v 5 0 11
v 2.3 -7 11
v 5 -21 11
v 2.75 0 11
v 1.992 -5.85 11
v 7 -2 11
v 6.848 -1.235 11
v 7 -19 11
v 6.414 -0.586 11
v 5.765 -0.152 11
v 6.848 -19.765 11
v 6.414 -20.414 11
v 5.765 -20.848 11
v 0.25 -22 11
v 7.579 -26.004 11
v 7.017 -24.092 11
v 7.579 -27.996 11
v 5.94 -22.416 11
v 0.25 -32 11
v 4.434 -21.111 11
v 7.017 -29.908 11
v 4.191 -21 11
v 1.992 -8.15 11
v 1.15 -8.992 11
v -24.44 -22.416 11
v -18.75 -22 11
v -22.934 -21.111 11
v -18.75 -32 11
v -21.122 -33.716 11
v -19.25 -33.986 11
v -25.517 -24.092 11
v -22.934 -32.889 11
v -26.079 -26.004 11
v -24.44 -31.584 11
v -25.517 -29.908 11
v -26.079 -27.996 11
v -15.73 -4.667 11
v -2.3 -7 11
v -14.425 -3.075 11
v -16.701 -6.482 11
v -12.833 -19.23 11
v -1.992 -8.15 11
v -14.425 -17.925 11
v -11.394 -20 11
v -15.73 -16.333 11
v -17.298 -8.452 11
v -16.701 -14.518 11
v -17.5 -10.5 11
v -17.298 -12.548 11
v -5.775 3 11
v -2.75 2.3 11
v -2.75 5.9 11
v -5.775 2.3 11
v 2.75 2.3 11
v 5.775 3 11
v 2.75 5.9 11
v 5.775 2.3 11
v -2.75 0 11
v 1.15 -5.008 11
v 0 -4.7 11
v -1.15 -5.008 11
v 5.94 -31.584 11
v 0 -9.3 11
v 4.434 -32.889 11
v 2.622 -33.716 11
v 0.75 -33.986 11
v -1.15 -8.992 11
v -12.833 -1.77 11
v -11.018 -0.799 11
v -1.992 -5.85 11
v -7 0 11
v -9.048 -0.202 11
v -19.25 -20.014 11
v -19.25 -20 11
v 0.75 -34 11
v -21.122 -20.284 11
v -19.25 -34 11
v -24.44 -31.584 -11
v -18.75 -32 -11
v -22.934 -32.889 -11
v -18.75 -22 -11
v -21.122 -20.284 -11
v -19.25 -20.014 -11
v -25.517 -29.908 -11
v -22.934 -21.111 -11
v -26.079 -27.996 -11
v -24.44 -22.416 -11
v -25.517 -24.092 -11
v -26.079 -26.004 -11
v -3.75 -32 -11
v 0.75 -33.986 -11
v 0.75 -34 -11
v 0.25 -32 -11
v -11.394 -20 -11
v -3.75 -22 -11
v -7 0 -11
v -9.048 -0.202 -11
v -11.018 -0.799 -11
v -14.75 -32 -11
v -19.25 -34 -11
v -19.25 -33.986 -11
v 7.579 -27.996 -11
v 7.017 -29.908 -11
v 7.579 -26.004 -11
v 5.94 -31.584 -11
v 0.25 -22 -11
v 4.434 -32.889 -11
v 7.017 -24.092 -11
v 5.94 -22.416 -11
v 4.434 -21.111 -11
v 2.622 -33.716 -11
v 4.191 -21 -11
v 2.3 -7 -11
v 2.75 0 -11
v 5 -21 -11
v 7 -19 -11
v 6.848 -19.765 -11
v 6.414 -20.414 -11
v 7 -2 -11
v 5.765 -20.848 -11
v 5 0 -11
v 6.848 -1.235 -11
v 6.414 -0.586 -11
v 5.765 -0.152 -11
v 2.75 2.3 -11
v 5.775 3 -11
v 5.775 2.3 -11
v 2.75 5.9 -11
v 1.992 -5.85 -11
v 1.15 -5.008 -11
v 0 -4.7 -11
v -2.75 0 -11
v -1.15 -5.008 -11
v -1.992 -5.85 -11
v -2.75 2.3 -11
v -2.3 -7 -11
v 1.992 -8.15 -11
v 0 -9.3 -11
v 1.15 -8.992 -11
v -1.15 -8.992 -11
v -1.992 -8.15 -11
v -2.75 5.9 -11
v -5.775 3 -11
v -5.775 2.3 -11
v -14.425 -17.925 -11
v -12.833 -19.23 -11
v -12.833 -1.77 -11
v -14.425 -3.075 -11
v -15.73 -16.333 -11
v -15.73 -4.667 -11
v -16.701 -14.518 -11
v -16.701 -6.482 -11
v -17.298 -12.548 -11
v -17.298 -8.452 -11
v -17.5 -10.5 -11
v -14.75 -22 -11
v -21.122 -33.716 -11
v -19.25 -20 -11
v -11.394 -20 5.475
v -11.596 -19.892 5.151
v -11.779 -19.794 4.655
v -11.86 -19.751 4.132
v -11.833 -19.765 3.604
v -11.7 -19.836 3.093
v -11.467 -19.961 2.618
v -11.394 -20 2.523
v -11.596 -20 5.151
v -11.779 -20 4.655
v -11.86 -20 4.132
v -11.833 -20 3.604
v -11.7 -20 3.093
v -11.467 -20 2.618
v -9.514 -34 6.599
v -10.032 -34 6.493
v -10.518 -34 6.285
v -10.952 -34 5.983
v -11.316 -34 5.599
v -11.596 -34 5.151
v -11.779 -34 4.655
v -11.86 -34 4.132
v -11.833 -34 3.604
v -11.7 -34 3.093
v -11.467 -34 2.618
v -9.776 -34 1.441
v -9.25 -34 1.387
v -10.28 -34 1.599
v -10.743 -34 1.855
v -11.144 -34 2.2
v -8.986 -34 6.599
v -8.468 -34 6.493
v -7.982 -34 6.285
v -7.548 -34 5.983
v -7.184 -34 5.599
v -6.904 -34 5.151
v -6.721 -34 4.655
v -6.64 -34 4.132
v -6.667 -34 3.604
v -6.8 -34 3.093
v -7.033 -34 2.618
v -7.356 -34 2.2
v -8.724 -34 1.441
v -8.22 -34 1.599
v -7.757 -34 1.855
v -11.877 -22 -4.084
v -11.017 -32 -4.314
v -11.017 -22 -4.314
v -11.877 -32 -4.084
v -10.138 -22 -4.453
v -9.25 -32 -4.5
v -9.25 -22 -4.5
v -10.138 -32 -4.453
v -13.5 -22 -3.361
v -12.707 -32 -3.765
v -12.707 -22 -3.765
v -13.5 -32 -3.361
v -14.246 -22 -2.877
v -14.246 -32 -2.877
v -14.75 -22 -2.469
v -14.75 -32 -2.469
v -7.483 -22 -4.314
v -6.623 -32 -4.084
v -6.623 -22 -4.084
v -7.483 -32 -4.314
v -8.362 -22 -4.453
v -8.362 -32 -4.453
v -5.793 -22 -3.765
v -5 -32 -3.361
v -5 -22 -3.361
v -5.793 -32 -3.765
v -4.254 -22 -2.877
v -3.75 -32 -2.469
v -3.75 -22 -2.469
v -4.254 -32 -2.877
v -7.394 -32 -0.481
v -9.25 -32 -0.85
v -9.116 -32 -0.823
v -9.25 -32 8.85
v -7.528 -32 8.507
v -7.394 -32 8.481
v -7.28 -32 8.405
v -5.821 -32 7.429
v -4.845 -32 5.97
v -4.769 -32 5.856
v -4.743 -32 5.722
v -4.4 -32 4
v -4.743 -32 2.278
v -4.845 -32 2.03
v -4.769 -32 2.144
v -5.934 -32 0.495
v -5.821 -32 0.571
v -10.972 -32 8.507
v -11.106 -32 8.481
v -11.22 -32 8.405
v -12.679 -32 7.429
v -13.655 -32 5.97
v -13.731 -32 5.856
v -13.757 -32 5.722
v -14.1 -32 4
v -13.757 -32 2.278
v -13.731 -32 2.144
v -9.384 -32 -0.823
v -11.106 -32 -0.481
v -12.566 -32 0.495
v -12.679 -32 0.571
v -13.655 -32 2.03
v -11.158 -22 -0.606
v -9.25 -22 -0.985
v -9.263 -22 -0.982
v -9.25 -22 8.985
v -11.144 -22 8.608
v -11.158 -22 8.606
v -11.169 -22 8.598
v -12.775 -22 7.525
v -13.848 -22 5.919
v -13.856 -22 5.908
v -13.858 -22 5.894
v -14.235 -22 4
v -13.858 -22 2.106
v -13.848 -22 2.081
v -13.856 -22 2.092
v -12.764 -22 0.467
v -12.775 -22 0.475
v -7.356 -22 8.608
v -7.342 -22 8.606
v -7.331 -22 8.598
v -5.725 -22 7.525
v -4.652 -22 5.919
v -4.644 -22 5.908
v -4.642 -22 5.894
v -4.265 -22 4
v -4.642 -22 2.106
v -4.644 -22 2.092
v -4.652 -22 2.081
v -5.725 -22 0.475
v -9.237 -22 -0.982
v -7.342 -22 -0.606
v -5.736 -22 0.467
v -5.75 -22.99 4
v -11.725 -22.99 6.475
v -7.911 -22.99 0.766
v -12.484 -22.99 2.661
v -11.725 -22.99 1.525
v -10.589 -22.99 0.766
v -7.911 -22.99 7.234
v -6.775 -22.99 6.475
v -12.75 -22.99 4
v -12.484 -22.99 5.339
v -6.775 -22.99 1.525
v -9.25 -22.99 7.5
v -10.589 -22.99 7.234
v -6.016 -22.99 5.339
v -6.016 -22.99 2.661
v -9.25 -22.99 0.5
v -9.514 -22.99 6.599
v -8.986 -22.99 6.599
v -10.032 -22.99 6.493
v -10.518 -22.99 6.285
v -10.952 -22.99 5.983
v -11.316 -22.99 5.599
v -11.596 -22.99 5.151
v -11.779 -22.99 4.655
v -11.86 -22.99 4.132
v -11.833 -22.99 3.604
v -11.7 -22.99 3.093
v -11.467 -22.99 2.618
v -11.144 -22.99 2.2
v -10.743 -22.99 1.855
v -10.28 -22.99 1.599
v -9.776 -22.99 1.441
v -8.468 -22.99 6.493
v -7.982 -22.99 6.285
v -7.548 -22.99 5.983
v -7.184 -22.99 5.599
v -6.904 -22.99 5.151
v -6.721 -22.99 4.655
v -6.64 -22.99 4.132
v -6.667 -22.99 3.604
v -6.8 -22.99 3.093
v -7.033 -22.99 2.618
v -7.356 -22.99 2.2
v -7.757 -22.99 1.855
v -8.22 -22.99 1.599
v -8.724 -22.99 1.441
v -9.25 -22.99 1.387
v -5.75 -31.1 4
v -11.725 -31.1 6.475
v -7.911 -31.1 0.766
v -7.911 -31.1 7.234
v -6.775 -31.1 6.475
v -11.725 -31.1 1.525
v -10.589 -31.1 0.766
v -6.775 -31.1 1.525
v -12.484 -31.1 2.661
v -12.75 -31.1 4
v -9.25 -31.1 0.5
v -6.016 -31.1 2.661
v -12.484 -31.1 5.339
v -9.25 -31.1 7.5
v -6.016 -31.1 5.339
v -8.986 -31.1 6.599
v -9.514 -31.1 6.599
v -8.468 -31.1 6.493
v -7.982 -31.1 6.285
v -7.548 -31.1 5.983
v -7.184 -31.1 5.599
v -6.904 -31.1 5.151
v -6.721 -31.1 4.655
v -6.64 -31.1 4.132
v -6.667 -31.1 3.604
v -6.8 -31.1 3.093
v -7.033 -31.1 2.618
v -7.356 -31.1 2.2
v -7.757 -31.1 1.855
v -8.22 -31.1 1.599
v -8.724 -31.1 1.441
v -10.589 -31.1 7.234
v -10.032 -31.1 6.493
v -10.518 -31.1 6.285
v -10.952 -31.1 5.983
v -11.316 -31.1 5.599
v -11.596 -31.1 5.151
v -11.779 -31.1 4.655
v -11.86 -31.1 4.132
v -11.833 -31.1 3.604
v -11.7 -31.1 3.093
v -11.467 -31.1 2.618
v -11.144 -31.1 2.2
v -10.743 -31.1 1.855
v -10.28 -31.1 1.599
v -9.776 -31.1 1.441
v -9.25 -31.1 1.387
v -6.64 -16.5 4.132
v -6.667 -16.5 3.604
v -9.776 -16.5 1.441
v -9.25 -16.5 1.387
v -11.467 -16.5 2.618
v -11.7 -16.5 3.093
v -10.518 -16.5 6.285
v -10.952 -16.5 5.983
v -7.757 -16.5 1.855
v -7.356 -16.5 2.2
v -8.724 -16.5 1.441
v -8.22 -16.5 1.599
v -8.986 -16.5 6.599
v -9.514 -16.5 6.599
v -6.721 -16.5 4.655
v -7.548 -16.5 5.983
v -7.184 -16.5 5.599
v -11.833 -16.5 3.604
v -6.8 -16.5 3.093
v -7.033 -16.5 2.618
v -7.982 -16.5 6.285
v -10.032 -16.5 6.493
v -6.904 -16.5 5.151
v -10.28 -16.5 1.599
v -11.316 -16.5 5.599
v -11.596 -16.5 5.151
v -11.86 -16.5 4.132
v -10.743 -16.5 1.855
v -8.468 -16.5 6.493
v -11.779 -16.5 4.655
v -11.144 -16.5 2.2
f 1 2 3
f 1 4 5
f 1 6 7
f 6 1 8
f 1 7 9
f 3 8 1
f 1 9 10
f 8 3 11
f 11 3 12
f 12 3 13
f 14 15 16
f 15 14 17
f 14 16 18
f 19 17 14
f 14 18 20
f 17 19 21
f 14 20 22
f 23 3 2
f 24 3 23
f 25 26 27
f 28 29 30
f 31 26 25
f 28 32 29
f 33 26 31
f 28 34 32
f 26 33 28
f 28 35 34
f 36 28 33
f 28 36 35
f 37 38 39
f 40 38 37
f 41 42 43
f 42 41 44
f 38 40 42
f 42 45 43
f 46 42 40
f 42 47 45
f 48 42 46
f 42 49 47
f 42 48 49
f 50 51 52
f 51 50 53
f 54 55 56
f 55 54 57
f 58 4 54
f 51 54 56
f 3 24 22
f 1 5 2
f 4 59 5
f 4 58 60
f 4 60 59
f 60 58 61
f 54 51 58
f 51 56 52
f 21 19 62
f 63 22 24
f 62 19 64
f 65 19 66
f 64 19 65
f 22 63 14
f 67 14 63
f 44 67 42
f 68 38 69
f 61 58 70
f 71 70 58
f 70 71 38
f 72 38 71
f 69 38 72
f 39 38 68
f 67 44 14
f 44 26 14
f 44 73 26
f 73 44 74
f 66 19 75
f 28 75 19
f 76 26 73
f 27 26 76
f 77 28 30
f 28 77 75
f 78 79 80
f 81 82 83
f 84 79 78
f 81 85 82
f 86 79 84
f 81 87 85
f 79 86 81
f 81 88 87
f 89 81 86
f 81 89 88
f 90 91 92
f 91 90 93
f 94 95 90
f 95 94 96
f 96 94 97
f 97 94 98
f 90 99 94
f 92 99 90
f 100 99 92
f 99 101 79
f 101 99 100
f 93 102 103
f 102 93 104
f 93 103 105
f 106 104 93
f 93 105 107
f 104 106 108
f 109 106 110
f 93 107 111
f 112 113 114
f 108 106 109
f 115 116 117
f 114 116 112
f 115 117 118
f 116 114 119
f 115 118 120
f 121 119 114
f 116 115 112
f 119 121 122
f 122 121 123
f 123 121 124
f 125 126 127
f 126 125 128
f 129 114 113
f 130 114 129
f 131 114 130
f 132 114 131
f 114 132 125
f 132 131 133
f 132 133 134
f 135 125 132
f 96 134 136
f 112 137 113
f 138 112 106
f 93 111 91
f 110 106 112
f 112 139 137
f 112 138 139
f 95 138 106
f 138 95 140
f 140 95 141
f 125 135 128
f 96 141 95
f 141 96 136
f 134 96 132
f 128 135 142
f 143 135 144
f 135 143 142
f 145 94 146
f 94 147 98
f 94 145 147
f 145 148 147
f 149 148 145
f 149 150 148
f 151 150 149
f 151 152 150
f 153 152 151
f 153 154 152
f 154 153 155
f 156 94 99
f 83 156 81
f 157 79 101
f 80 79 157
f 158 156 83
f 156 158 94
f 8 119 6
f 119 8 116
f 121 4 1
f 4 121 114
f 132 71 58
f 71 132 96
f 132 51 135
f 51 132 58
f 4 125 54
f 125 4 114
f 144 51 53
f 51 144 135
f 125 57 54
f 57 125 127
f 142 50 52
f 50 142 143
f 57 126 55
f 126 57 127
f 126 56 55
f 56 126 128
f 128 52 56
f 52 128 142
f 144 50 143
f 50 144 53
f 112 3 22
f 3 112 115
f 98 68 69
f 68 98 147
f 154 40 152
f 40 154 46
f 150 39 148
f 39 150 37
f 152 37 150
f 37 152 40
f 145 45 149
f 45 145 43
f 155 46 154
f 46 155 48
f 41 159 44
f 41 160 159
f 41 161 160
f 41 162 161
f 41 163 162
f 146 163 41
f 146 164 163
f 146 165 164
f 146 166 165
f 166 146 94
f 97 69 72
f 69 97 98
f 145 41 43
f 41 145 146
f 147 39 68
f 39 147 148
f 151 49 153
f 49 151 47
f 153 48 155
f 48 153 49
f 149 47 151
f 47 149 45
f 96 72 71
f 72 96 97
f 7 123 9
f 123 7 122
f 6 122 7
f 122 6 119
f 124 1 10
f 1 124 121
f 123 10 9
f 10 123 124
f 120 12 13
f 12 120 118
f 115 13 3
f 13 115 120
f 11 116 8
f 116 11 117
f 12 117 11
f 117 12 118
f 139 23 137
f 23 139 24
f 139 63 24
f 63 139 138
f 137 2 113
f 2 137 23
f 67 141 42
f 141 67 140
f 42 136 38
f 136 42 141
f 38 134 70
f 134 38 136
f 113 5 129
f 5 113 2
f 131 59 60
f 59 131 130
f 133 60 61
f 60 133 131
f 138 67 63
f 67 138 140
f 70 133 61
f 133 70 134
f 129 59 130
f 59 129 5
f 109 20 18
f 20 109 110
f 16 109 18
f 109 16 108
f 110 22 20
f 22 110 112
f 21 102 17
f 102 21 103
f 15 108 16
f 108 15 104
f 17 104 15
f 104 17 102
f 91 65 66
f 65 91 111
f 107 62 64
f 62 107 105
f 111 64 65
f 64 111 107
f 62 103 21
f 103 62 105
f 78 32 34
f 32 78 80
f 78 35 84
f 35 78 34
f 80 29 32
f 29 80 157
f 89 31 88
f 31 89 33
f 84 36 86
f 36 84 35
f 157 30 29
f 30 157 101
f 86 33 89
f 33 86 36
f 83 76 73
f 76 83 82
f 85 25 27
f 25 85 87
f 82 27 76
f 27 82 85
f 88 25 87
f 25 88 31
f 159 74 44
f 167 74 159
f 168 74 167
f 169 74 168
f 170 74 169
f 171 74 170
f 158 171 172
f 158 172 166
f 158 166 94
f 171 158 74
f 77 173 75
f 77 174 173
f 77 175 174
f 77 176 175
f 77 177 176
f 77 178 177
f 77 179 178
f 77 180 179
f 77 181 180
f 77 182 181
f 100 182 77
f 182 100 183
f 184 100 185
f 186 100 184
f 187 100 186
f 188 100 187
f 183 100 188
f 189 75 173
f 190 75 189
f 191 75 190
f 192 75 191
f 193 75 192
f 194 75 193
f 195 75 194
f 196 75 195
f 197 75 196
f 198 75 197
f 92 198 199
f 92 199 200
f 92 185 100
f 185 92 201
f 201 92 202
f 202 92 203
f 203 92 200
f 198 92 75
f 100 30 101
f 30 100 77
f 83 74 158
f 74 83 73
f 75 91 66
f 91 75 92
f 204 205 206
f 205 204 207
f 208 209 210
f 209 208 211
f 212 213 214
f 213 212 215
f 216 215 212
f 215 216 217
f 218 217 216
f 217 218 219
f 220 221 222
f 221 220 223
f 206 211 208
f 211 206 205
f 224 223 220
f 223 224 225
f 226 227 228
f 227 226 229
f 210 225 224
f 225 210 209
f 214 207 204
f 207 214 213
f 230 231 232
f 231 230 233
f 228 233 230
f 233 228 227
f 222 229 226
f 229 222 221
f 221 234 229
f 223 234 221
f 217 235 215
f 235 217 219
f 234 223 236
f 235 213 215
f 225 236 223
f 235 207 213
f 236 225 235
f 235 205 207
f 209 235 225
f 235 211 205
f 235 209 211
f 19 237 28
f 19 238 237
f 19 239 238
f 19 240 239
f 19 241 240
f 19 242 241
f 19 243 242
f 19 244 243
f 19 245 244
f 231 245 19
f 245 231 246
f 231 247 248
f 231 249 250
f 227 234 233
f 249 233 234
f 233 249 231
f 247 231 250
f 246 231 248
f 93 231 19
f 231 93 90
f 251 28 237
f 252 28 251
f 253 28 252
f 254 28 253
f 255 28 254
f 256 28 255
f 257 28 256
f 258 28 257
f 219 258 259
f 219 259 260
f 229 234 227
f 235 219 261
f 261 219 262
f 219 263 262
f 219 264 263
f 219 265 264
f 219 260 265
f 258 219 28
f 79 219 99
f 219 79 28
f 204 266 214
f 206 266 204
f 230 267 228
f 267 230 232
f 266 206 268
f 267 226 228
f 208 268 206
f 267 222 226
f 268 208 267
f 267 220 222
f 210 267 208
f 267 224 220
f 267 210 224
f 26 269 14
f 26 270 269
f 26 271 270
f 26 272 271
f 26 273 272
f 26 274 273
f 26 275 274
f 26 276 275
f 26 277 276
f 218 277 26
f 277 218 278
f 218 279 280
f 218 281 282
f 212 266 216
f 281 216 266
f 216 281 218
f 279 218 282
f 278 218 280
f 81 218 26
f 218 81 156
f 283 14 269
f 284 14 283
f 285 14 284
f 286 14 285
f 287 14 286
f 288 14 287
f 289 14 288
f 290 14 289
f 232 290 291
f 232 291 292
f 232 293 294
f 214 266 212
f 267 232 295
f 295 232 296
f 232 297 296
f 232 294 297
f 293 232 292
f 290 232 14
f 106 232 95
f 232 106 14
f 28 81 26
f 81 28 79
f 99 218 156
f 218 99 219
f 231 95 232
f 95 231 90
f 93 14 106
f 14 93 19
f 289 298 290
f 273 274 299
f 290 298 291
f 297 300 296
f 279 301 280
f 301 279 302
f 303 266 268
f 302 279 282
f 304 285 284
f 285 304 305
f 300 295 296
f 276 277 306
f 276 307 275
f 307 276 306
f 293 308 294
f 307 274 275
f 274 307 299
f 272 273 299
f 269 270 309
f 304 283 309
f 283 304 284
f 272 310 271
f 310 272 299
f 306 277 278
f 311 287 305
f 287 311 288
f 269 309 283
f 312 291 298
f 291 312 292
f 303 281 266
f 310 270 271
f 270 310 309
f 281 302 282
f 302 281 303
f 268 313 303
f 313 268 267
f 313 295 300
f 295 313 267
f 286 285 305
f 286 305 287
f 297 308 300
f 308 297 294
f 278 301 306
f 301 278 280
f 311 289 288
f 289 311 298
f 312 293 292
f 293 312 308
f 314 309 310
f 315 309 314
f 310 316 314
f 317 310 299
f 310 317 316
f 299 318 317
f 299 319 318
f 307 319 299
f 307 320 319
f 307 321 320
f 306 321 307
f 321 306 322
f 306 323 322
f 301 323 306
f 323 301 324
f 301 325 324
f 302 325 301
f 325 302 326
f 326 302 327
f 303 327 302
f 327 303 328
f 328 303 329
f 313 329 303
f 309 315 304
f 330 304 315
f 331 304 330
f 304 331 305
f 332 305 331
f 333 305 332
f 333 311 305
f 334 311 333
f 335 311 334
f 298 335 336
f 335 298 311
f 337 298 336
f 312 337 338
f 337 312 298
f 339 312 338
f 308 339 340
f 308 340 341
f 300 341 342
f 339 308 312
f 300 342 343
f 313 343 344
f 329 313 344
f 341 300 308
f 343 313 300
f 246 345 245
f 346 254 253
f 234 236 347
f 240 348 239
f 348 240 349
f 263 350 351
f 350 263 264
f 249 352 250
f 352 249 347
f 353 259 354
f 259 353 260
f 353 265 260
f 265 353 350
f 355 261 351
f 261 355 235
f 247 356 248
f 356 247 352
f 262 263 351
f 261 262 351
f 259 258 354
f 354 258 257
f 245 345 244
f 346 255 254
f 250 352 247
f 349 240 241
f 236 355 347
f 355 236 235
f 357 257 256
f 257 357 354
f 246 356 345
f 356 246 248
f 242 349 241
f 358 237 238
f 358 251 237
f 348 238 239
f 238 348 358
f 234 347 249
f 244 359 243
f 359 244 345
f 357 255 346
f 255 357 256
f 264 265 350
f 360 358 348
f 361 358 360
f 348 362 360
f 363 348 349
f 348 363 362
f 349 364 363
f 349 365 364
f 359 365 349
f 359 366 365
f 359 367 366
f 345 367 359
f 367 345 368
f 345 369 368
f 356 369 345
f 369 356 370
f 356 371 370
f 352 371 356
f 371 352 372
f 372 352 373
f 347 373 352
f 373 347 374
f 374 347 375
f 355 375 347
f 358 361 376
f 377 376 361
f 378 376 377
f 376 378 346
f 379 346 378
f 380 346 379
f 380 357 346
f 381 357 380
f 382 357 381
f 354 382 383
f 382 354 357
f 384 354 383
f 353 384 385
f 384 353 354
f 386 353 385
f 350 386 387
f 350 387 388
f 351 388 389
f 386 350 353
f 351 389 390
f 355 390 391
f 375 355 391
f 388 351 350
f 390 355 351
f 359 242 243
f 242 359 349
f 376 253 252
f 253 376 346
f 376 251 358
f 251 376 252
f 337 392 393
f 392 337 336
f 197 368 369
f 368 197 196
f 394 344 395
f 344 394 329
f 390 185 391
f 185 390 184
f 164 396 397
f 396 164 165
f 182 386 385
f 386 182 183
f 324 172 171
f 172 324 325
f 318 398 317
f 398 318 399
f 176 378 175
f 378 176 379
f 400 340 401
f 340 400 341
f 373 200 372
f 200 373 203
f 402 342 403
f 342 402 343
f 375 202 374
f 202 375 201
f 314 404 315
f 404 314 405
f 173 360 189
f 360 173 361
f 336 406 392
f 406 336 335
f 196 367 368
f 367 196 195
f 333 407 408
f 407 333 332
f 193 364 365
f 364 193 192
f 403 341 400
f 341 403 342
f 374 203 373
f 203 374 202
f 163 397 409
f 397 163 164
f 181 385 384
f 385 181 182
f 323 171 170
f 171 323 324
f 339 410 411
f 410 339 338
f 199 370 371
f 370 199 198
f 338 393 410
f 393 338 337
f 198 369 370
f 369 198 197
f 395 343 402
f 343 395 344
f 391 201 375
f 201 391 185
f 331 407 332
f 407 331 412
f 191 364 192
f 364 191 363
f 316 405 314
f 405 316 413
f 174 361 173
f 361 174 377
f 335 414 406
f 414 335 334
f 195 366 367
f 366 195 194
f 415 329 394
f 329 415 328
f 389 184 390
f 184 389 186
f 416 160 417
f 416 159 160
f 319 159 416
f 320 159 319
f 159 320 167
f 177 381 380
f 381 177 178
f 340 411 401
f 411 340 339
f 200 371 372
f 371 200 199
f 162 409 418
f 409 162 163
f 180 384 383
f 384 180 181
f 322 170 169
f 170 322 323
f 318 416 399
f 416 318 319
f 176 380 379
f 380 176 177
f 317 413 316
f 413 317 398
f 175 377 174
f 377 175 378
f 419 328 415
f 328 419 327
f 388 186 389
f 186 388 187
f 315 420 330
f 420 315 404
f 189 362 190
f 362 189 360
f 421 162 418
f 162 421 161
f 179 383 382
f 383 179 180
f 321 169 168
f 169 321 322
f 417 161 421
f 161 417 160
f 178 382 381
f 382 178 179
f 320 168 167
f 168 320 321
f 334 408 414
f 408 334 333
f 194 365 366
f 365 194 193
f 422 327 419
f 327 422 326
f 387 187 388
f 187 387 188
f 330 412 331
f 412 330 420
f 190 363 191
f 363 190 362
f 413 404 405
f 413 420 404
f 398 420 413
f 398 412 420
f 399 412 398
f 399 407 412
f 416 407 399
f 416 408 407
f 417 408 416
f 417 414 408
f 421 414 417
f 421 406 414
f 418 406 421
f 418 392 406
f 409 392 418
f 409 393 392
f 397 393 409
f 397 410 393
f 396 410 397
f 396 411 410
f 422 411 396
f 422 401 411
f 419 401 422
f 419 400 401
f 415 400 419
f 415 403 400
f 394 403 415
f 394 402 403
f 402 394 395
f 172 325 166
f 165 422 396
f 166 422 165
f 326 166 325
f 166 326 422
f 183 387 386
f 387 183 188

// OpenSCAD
// file: misumi-parts-library.scad
module hfs2040(l) {
	// hfs5_2040
	color("silver") {
		rotate([-90,0,0]) translate([0,0,l]) scale([1,1,l/500]) import("misumi/hfs5_2040_500.stl");
	}
}

module hfs2020(l) {
	// hfs5_2020
	color("silver") {
		rotate([-90,0,0]) translate([0,0,l]) scale([1,1,l/50]) import("misumi/hfs5_2020_50.stl");
	}
}

module hfs60() {
	translate([0,0,100]) import("misumi/hfs60a5_20_100.stl");
}

module hblss5() {
	import("misumi/hblss5.stl");
}
module hblfsnf5() {
	import("misumi/hblfsnf5.stl");
}
module hblfsn5() {
	import("misumi/hblfsn5.stl");
}
module hblsd5() {
	color("blue") import("misumi/hblsd5.stl");
}

module hblfsd5() {
	color("blue") import("misumi/hblfsd5.stl");
}

module hblts5() {
	color("blue") import("misumi/hblts5.stl");
}

module hblfssw5() {
	color("blue") import("misumi/hblfssw5.stl");
}

module flatbracket2x2() {
	// HPTSd5
	difference() {
		color("blue") cube([36, 36, 2.3], center=true);
		#translate([10, 10, -2]) cylinder(r= 5.5/2, h= 4);
		#translate([-10, 10, -2]) cylinder(r= 5.5/2, h= 4);
		#translate([10, -10, -2]) cylinder(r= 5.5/2, h= 4);
		#translate([-10, -10, -2]) cylinder(r= 5.5/2, h= 4);
	}
}

module tbracket() {
	// HPTTD5
	translate([-110/2, 0,0]) difference() {
		 union() {
			color("blue"){ 
				cube([110, 38, 2.3]);
				translate([110/2-38/2,-38,0]) cube([38, 80-38, 2.3]);
			}
		}
		#translate([9, 9, 0]) cylinder(r= 5.5/2, h= 4);
		#translate([9, 9+20, 0]) cylinder(r= 5.5/2, h= 4);
		#translate([110-9, 9, 0]) cylinder(r= 5.5/2, h= 4);
		#translate([110-9, 9+20, 0]) cylinder(r= 5.5/2, h= 4);
		translate([110/2-38/2,-38,0]) {
			#translate([9, 9, 0]) cylinder(r= 5.5/2, h= 4);
			#translate([9, 9+20, 0]) cylinder(r= 5.5/2, h= 4);
			#translate([38-9, 9, 0]) cylinder(r= 5.5/2, h= 4);
			#translate([38-9, 9+20, 0]) cylinder(r= 5.5/2, h= 4);
		}
	}
}

module tbracket1() {
	// HPTTS5
	//thick= 2.3; // real
	thick= 4; // printable
	translate([-100/2, 0,0]) difference() {
		 union() {
			color("blue"){ 
				cube([100, 18, thick]);
				translate([100/2-18/2,18,0]) cube([18, 90-18, thick]);
			}
		}
		#translate([10, 9, -2]) cylinder(r= 5.5/2, h= thick+4);
		#translate([100-10, 9, -2]) cylinder(r= 5.5/2, h= thick+4);
		#translate([50, 9, -2]) cylinder(r= 5.5/2, h= thick+4);
		translate([100/2-18/2,18,0]) {
			#translate([9, 90-18-10, -2]) cylinder(r= 5.5/2, h= thick+4);
			#translate([9, 90-18-10-30, -2]) cylinder(r= 5.5/2, h= thick+4);
		}
	}
}
// file: myLibs.scad
pi= 3.14159265359;

module hole(diam, height, clearance= 0.1)
{
        fn= round(diam * pi / 0.5);
        cylinder(h= height, r=diam / 2 / cos(180 / fn) + clearance, $fn=fn);
}

module nutTrap(ffd, faces=6, height=1)
{
	cylinder(h= height, r=ffd / cos(180 / faces) / 2 + 0.05, $fn=faces);
}

// A slot which has rounded ends, but total length is l
module slot(d= 4, l= 8, ht= 1, clearance=0.1) {
	fn= round(d * pi / 0.5);
	rd= d / 2 / cos(180 / fn) + clearance;
	d1= rd*2;
	union() {
		translate([0,0,ht/2]) cube([l-d1, d1, ht], center=true);
		translate([-(l-d1)/2, 0, ht/2]) cylinder(h=ht, r=rd, $fn=fn, center=true); 
		translate([(l-d1)/2, 0, ht/2]) cylinder(h=ht, r=rd, $fn=fn, center=true); 
	}	
}

module nslot(d=4, l= 8, ht=1, clearance=0.1) {
	x= l-(d+clearance);
	hull() {
		translate([x/2, 0, 0])  hole(d, ht, clearance);
		translate([-x/2,0,0]) hole(d,ht, clearance);
	}
}
// file: 2020-insert.scad
use <misumi-parts-library.scad>

slotneckw= 6-0.5;
slotthick= 2+0.3;
slotdepth= 3.2+0.6-0.2;
slotwidth= 9.95+1.6;
shoulder=0.7;
edge= (slotwidth-slotneckw)/2;
diagl=3.6;

p1= [0,0];
p2= [slotwidth,0];
p3= [slotwidth,-shoulder];
p4= [slotwidth-edge,-slotdepth];
p5= [edge,-slotdepth];
p6= [0,-shoulder];
p7= [0,0];

module slider_body(width, height, thick) {
	union() {
		translate([-width/2,slotthick,0]) cube([width,thick,height]);
		translate([-slotneckw/2,0,0]) cube([slotneckw, slotthick, height]);
		translate([-slotwidth/2,0,0]) linear_extrude(height=height)
			polygon(points=[ p1,p2,p3,p4,p5,p6,p7 ]);
	}
}

module slider2020(w= 20, h= 20, t=2) {
	translate([0,-slotthick,0]) slider_body(w, h, t);
}

slider2020(w=10, h=10, t=2);
% translate([10, -10.1, 0])  rotate([90, 0, 90])   hfs2040(50);
// main file
// idler for two back to back F695ZZ flanged bearings
//  5*13*4

use <2020-insert.scad>
use <myLibs.scad>

bearingID= 5;
bearingOD= 13;
bearingWidth= 4*2;
bearingFlangeOD= 15;
bearingFlangeWidth= 1;

function pulley_width()= bearingWidth;
function pulley_diameter()= bearingFlangeOD;


gt2_inner_dia= 12.25;
offset_x = -20; // distance from makerslide
offset_y = 10 - (bearingOD-gt2_inner_dia); // left/right offset, to align belt with pulley
rotate_z = -90;
clearance= 2;
offset_z= 4;
block_width= abs(offset_x)+1;
block_length= 14;

belt_thick= 2; // 1.45
belt_width= 6;
belt_clearance= 2;
thick= 3*2;

function tensioner_height()= 22;

//block();
//tensioner_body();
//tensioner_support();

tensioner_695();

// generate a negative fillet for an edge
module fillet(pos= [0,0,0], radius=3, height=100, fn=16, angle= 0) {
   translate(pos) rotate([0,0,angle]) translate([-radius, -radius, -height/2-0.01])
        difference() {
            cube([radius*2, radius*2, height+0.02]);
            cylinder(r=radius, h=height+0.02, $fn=fn);
        }
}

module tensioner_support() {
	difference() {
		union() {
			// flanges
			translate([0, pulley_width()/2, offset_z]) rotate([90, 0, 0]) cylinder(r=bearingFlangeOD/2, h=bearingFlangeWidth, center=false);
			translate([0, -pulley_width()/2+bearingFlangeWidth, offset_z]) rotate([90, 0, 0]) cylinder(r=bearingFlangeOD/2, h=bearingFlangeWidth, center=false);
			translate([0, bearingWidth/2, offset_z]) rotate([90, 0, 0]) cylinder(r=bearingOD/2, h=bearingWidth, center=false);
		}
		translate([0, 5, offset_z]) rotate([90, 0, 0]) cylinder(r=bearingID/2, h=10, center=false);
	}
}

module block() {
		rotate([0, 0, rotate_z]) translate([offset_x-(pulley_width()+thick)/2, offset_y, 0]) {
			difference() {
				union() {
					translate([block_width/2, 0, 0]) cube([block_width, block_length, tensioner_height()], center=true);
					translate([block_width/2, -block_length/2, 0]) cylinder(r=block_width/2, h=tensioner_height(), center=true, $fn=32);
					// t slot
					translate([0,0,-tensioner_height()/2]) rotate([0,0,-90]) slider2020(h=tensioner_height(), w=14, t=2);

				}
				fillet(pos=[0,block_length/2,0], radius=2, angle=90);
				fillet(pos=[block_width,block_length/2,0], radius=2, angle=0);

				// 1/4" hole for tensioner
				#translate([7,0,10]) cylinder(r=(4)/2+0.3, h=50, center=true, $fn=12);
		}
	}
}

module end() {
	intersection() {
		cylinder(r=(pulley_width()+thick)/2, h=tensioner_height(), center=true);
		translate([0, -(pulley_width()+thick)/2, 0]) cube(size=[pulley_width()+thick, pulley_width()+thick, tensioner_height()], center=true);
	}
}

module tensioner_body() {
	difference() {
		union() {
			cube([pulley_width()+thick, pulley_diameter()+belt_thick+thick/2, tensioner_height()], center=true);
			translate([0, -(pulley_diameter()+belt_thick+thick/2)/2+0.1, 0]) end();
			translate([0, (pulley_diameter()+belt_thick+thick/2)/2-0.1, 0]) rotate([0, 0, 180])  end();
		}

		translate([0, 0, offset_z]) {
			// bearing
			rotate([0, 90, 0]) cylinder(r=(pulley_diameter()+clearance)/2, h=pulley_width()+clearance, center=true, $fn=60);
			// shaft
			//#translate([-14/2,0,0]) rotate([0, 90, 0]) hole(8, 14);
		}
		// belt slots
		translate([0, bearingOD/2+belt_thick/2, 0]) cube(size=[pulley_width()+clearance, belt_thick+belt_clearance, 40], center=true);
		translate([0, -bearingOD/2-belt_thick/2, 0]) cube(size=[pulley_width()+clearance, belt_thick+belt_clearance, 40], center=true);

		// clear top
		translate([0, 0, tensioner_height()/2])  cube(size=[pulley_width()+clearance, pulley_diameter(), 5], center=true);
	}
}

module tensioner_695() {
	translate([-offset_y,offset_x-(pulley_width()+thick)/2,0]) difference() {
		union() {
			block();
			translate([0, 0, 0]) rotate([0, 0, 90])  tensioner_body();
			translate([0,(pulley_width()+clearance)/2+0.01,offset_z]) horn(true);
			translate([0,-(pulley_width()+clearance)/2-0.1,offset_z]) horn(false);
		}
		// bearing shaft
		//translate([0,block_width/2,offset_z+0.5]) rotate([90, 90, 0]) slot(8, 9, 18);
		#translate([0,block_width/2,offset_z]) rotate([90, 90, 0]) hole(bearingID, 19);
		//translate([0, -12, 0])  cube([50, 20, 50], center=true); // cutaway to see clearance
	}

	%translate([-offset_y,offset_x-(pulley_width()+thick)/2,0]) tensioner_support();

	// belts
	%translate([-offset_y- bearingOD/2-belt_thick, offset_x-(pulley_width()+thick)/2-belt_width/2, -25]) color("gray") cube([belt_thick, belt_width, 50]);
}

module horn(front=true) {
	rotate([front?90:-90, 0, 0])  cylinder(r1= bearingID/2+2.5, r2=bearingID/2+1, h=1);
}
